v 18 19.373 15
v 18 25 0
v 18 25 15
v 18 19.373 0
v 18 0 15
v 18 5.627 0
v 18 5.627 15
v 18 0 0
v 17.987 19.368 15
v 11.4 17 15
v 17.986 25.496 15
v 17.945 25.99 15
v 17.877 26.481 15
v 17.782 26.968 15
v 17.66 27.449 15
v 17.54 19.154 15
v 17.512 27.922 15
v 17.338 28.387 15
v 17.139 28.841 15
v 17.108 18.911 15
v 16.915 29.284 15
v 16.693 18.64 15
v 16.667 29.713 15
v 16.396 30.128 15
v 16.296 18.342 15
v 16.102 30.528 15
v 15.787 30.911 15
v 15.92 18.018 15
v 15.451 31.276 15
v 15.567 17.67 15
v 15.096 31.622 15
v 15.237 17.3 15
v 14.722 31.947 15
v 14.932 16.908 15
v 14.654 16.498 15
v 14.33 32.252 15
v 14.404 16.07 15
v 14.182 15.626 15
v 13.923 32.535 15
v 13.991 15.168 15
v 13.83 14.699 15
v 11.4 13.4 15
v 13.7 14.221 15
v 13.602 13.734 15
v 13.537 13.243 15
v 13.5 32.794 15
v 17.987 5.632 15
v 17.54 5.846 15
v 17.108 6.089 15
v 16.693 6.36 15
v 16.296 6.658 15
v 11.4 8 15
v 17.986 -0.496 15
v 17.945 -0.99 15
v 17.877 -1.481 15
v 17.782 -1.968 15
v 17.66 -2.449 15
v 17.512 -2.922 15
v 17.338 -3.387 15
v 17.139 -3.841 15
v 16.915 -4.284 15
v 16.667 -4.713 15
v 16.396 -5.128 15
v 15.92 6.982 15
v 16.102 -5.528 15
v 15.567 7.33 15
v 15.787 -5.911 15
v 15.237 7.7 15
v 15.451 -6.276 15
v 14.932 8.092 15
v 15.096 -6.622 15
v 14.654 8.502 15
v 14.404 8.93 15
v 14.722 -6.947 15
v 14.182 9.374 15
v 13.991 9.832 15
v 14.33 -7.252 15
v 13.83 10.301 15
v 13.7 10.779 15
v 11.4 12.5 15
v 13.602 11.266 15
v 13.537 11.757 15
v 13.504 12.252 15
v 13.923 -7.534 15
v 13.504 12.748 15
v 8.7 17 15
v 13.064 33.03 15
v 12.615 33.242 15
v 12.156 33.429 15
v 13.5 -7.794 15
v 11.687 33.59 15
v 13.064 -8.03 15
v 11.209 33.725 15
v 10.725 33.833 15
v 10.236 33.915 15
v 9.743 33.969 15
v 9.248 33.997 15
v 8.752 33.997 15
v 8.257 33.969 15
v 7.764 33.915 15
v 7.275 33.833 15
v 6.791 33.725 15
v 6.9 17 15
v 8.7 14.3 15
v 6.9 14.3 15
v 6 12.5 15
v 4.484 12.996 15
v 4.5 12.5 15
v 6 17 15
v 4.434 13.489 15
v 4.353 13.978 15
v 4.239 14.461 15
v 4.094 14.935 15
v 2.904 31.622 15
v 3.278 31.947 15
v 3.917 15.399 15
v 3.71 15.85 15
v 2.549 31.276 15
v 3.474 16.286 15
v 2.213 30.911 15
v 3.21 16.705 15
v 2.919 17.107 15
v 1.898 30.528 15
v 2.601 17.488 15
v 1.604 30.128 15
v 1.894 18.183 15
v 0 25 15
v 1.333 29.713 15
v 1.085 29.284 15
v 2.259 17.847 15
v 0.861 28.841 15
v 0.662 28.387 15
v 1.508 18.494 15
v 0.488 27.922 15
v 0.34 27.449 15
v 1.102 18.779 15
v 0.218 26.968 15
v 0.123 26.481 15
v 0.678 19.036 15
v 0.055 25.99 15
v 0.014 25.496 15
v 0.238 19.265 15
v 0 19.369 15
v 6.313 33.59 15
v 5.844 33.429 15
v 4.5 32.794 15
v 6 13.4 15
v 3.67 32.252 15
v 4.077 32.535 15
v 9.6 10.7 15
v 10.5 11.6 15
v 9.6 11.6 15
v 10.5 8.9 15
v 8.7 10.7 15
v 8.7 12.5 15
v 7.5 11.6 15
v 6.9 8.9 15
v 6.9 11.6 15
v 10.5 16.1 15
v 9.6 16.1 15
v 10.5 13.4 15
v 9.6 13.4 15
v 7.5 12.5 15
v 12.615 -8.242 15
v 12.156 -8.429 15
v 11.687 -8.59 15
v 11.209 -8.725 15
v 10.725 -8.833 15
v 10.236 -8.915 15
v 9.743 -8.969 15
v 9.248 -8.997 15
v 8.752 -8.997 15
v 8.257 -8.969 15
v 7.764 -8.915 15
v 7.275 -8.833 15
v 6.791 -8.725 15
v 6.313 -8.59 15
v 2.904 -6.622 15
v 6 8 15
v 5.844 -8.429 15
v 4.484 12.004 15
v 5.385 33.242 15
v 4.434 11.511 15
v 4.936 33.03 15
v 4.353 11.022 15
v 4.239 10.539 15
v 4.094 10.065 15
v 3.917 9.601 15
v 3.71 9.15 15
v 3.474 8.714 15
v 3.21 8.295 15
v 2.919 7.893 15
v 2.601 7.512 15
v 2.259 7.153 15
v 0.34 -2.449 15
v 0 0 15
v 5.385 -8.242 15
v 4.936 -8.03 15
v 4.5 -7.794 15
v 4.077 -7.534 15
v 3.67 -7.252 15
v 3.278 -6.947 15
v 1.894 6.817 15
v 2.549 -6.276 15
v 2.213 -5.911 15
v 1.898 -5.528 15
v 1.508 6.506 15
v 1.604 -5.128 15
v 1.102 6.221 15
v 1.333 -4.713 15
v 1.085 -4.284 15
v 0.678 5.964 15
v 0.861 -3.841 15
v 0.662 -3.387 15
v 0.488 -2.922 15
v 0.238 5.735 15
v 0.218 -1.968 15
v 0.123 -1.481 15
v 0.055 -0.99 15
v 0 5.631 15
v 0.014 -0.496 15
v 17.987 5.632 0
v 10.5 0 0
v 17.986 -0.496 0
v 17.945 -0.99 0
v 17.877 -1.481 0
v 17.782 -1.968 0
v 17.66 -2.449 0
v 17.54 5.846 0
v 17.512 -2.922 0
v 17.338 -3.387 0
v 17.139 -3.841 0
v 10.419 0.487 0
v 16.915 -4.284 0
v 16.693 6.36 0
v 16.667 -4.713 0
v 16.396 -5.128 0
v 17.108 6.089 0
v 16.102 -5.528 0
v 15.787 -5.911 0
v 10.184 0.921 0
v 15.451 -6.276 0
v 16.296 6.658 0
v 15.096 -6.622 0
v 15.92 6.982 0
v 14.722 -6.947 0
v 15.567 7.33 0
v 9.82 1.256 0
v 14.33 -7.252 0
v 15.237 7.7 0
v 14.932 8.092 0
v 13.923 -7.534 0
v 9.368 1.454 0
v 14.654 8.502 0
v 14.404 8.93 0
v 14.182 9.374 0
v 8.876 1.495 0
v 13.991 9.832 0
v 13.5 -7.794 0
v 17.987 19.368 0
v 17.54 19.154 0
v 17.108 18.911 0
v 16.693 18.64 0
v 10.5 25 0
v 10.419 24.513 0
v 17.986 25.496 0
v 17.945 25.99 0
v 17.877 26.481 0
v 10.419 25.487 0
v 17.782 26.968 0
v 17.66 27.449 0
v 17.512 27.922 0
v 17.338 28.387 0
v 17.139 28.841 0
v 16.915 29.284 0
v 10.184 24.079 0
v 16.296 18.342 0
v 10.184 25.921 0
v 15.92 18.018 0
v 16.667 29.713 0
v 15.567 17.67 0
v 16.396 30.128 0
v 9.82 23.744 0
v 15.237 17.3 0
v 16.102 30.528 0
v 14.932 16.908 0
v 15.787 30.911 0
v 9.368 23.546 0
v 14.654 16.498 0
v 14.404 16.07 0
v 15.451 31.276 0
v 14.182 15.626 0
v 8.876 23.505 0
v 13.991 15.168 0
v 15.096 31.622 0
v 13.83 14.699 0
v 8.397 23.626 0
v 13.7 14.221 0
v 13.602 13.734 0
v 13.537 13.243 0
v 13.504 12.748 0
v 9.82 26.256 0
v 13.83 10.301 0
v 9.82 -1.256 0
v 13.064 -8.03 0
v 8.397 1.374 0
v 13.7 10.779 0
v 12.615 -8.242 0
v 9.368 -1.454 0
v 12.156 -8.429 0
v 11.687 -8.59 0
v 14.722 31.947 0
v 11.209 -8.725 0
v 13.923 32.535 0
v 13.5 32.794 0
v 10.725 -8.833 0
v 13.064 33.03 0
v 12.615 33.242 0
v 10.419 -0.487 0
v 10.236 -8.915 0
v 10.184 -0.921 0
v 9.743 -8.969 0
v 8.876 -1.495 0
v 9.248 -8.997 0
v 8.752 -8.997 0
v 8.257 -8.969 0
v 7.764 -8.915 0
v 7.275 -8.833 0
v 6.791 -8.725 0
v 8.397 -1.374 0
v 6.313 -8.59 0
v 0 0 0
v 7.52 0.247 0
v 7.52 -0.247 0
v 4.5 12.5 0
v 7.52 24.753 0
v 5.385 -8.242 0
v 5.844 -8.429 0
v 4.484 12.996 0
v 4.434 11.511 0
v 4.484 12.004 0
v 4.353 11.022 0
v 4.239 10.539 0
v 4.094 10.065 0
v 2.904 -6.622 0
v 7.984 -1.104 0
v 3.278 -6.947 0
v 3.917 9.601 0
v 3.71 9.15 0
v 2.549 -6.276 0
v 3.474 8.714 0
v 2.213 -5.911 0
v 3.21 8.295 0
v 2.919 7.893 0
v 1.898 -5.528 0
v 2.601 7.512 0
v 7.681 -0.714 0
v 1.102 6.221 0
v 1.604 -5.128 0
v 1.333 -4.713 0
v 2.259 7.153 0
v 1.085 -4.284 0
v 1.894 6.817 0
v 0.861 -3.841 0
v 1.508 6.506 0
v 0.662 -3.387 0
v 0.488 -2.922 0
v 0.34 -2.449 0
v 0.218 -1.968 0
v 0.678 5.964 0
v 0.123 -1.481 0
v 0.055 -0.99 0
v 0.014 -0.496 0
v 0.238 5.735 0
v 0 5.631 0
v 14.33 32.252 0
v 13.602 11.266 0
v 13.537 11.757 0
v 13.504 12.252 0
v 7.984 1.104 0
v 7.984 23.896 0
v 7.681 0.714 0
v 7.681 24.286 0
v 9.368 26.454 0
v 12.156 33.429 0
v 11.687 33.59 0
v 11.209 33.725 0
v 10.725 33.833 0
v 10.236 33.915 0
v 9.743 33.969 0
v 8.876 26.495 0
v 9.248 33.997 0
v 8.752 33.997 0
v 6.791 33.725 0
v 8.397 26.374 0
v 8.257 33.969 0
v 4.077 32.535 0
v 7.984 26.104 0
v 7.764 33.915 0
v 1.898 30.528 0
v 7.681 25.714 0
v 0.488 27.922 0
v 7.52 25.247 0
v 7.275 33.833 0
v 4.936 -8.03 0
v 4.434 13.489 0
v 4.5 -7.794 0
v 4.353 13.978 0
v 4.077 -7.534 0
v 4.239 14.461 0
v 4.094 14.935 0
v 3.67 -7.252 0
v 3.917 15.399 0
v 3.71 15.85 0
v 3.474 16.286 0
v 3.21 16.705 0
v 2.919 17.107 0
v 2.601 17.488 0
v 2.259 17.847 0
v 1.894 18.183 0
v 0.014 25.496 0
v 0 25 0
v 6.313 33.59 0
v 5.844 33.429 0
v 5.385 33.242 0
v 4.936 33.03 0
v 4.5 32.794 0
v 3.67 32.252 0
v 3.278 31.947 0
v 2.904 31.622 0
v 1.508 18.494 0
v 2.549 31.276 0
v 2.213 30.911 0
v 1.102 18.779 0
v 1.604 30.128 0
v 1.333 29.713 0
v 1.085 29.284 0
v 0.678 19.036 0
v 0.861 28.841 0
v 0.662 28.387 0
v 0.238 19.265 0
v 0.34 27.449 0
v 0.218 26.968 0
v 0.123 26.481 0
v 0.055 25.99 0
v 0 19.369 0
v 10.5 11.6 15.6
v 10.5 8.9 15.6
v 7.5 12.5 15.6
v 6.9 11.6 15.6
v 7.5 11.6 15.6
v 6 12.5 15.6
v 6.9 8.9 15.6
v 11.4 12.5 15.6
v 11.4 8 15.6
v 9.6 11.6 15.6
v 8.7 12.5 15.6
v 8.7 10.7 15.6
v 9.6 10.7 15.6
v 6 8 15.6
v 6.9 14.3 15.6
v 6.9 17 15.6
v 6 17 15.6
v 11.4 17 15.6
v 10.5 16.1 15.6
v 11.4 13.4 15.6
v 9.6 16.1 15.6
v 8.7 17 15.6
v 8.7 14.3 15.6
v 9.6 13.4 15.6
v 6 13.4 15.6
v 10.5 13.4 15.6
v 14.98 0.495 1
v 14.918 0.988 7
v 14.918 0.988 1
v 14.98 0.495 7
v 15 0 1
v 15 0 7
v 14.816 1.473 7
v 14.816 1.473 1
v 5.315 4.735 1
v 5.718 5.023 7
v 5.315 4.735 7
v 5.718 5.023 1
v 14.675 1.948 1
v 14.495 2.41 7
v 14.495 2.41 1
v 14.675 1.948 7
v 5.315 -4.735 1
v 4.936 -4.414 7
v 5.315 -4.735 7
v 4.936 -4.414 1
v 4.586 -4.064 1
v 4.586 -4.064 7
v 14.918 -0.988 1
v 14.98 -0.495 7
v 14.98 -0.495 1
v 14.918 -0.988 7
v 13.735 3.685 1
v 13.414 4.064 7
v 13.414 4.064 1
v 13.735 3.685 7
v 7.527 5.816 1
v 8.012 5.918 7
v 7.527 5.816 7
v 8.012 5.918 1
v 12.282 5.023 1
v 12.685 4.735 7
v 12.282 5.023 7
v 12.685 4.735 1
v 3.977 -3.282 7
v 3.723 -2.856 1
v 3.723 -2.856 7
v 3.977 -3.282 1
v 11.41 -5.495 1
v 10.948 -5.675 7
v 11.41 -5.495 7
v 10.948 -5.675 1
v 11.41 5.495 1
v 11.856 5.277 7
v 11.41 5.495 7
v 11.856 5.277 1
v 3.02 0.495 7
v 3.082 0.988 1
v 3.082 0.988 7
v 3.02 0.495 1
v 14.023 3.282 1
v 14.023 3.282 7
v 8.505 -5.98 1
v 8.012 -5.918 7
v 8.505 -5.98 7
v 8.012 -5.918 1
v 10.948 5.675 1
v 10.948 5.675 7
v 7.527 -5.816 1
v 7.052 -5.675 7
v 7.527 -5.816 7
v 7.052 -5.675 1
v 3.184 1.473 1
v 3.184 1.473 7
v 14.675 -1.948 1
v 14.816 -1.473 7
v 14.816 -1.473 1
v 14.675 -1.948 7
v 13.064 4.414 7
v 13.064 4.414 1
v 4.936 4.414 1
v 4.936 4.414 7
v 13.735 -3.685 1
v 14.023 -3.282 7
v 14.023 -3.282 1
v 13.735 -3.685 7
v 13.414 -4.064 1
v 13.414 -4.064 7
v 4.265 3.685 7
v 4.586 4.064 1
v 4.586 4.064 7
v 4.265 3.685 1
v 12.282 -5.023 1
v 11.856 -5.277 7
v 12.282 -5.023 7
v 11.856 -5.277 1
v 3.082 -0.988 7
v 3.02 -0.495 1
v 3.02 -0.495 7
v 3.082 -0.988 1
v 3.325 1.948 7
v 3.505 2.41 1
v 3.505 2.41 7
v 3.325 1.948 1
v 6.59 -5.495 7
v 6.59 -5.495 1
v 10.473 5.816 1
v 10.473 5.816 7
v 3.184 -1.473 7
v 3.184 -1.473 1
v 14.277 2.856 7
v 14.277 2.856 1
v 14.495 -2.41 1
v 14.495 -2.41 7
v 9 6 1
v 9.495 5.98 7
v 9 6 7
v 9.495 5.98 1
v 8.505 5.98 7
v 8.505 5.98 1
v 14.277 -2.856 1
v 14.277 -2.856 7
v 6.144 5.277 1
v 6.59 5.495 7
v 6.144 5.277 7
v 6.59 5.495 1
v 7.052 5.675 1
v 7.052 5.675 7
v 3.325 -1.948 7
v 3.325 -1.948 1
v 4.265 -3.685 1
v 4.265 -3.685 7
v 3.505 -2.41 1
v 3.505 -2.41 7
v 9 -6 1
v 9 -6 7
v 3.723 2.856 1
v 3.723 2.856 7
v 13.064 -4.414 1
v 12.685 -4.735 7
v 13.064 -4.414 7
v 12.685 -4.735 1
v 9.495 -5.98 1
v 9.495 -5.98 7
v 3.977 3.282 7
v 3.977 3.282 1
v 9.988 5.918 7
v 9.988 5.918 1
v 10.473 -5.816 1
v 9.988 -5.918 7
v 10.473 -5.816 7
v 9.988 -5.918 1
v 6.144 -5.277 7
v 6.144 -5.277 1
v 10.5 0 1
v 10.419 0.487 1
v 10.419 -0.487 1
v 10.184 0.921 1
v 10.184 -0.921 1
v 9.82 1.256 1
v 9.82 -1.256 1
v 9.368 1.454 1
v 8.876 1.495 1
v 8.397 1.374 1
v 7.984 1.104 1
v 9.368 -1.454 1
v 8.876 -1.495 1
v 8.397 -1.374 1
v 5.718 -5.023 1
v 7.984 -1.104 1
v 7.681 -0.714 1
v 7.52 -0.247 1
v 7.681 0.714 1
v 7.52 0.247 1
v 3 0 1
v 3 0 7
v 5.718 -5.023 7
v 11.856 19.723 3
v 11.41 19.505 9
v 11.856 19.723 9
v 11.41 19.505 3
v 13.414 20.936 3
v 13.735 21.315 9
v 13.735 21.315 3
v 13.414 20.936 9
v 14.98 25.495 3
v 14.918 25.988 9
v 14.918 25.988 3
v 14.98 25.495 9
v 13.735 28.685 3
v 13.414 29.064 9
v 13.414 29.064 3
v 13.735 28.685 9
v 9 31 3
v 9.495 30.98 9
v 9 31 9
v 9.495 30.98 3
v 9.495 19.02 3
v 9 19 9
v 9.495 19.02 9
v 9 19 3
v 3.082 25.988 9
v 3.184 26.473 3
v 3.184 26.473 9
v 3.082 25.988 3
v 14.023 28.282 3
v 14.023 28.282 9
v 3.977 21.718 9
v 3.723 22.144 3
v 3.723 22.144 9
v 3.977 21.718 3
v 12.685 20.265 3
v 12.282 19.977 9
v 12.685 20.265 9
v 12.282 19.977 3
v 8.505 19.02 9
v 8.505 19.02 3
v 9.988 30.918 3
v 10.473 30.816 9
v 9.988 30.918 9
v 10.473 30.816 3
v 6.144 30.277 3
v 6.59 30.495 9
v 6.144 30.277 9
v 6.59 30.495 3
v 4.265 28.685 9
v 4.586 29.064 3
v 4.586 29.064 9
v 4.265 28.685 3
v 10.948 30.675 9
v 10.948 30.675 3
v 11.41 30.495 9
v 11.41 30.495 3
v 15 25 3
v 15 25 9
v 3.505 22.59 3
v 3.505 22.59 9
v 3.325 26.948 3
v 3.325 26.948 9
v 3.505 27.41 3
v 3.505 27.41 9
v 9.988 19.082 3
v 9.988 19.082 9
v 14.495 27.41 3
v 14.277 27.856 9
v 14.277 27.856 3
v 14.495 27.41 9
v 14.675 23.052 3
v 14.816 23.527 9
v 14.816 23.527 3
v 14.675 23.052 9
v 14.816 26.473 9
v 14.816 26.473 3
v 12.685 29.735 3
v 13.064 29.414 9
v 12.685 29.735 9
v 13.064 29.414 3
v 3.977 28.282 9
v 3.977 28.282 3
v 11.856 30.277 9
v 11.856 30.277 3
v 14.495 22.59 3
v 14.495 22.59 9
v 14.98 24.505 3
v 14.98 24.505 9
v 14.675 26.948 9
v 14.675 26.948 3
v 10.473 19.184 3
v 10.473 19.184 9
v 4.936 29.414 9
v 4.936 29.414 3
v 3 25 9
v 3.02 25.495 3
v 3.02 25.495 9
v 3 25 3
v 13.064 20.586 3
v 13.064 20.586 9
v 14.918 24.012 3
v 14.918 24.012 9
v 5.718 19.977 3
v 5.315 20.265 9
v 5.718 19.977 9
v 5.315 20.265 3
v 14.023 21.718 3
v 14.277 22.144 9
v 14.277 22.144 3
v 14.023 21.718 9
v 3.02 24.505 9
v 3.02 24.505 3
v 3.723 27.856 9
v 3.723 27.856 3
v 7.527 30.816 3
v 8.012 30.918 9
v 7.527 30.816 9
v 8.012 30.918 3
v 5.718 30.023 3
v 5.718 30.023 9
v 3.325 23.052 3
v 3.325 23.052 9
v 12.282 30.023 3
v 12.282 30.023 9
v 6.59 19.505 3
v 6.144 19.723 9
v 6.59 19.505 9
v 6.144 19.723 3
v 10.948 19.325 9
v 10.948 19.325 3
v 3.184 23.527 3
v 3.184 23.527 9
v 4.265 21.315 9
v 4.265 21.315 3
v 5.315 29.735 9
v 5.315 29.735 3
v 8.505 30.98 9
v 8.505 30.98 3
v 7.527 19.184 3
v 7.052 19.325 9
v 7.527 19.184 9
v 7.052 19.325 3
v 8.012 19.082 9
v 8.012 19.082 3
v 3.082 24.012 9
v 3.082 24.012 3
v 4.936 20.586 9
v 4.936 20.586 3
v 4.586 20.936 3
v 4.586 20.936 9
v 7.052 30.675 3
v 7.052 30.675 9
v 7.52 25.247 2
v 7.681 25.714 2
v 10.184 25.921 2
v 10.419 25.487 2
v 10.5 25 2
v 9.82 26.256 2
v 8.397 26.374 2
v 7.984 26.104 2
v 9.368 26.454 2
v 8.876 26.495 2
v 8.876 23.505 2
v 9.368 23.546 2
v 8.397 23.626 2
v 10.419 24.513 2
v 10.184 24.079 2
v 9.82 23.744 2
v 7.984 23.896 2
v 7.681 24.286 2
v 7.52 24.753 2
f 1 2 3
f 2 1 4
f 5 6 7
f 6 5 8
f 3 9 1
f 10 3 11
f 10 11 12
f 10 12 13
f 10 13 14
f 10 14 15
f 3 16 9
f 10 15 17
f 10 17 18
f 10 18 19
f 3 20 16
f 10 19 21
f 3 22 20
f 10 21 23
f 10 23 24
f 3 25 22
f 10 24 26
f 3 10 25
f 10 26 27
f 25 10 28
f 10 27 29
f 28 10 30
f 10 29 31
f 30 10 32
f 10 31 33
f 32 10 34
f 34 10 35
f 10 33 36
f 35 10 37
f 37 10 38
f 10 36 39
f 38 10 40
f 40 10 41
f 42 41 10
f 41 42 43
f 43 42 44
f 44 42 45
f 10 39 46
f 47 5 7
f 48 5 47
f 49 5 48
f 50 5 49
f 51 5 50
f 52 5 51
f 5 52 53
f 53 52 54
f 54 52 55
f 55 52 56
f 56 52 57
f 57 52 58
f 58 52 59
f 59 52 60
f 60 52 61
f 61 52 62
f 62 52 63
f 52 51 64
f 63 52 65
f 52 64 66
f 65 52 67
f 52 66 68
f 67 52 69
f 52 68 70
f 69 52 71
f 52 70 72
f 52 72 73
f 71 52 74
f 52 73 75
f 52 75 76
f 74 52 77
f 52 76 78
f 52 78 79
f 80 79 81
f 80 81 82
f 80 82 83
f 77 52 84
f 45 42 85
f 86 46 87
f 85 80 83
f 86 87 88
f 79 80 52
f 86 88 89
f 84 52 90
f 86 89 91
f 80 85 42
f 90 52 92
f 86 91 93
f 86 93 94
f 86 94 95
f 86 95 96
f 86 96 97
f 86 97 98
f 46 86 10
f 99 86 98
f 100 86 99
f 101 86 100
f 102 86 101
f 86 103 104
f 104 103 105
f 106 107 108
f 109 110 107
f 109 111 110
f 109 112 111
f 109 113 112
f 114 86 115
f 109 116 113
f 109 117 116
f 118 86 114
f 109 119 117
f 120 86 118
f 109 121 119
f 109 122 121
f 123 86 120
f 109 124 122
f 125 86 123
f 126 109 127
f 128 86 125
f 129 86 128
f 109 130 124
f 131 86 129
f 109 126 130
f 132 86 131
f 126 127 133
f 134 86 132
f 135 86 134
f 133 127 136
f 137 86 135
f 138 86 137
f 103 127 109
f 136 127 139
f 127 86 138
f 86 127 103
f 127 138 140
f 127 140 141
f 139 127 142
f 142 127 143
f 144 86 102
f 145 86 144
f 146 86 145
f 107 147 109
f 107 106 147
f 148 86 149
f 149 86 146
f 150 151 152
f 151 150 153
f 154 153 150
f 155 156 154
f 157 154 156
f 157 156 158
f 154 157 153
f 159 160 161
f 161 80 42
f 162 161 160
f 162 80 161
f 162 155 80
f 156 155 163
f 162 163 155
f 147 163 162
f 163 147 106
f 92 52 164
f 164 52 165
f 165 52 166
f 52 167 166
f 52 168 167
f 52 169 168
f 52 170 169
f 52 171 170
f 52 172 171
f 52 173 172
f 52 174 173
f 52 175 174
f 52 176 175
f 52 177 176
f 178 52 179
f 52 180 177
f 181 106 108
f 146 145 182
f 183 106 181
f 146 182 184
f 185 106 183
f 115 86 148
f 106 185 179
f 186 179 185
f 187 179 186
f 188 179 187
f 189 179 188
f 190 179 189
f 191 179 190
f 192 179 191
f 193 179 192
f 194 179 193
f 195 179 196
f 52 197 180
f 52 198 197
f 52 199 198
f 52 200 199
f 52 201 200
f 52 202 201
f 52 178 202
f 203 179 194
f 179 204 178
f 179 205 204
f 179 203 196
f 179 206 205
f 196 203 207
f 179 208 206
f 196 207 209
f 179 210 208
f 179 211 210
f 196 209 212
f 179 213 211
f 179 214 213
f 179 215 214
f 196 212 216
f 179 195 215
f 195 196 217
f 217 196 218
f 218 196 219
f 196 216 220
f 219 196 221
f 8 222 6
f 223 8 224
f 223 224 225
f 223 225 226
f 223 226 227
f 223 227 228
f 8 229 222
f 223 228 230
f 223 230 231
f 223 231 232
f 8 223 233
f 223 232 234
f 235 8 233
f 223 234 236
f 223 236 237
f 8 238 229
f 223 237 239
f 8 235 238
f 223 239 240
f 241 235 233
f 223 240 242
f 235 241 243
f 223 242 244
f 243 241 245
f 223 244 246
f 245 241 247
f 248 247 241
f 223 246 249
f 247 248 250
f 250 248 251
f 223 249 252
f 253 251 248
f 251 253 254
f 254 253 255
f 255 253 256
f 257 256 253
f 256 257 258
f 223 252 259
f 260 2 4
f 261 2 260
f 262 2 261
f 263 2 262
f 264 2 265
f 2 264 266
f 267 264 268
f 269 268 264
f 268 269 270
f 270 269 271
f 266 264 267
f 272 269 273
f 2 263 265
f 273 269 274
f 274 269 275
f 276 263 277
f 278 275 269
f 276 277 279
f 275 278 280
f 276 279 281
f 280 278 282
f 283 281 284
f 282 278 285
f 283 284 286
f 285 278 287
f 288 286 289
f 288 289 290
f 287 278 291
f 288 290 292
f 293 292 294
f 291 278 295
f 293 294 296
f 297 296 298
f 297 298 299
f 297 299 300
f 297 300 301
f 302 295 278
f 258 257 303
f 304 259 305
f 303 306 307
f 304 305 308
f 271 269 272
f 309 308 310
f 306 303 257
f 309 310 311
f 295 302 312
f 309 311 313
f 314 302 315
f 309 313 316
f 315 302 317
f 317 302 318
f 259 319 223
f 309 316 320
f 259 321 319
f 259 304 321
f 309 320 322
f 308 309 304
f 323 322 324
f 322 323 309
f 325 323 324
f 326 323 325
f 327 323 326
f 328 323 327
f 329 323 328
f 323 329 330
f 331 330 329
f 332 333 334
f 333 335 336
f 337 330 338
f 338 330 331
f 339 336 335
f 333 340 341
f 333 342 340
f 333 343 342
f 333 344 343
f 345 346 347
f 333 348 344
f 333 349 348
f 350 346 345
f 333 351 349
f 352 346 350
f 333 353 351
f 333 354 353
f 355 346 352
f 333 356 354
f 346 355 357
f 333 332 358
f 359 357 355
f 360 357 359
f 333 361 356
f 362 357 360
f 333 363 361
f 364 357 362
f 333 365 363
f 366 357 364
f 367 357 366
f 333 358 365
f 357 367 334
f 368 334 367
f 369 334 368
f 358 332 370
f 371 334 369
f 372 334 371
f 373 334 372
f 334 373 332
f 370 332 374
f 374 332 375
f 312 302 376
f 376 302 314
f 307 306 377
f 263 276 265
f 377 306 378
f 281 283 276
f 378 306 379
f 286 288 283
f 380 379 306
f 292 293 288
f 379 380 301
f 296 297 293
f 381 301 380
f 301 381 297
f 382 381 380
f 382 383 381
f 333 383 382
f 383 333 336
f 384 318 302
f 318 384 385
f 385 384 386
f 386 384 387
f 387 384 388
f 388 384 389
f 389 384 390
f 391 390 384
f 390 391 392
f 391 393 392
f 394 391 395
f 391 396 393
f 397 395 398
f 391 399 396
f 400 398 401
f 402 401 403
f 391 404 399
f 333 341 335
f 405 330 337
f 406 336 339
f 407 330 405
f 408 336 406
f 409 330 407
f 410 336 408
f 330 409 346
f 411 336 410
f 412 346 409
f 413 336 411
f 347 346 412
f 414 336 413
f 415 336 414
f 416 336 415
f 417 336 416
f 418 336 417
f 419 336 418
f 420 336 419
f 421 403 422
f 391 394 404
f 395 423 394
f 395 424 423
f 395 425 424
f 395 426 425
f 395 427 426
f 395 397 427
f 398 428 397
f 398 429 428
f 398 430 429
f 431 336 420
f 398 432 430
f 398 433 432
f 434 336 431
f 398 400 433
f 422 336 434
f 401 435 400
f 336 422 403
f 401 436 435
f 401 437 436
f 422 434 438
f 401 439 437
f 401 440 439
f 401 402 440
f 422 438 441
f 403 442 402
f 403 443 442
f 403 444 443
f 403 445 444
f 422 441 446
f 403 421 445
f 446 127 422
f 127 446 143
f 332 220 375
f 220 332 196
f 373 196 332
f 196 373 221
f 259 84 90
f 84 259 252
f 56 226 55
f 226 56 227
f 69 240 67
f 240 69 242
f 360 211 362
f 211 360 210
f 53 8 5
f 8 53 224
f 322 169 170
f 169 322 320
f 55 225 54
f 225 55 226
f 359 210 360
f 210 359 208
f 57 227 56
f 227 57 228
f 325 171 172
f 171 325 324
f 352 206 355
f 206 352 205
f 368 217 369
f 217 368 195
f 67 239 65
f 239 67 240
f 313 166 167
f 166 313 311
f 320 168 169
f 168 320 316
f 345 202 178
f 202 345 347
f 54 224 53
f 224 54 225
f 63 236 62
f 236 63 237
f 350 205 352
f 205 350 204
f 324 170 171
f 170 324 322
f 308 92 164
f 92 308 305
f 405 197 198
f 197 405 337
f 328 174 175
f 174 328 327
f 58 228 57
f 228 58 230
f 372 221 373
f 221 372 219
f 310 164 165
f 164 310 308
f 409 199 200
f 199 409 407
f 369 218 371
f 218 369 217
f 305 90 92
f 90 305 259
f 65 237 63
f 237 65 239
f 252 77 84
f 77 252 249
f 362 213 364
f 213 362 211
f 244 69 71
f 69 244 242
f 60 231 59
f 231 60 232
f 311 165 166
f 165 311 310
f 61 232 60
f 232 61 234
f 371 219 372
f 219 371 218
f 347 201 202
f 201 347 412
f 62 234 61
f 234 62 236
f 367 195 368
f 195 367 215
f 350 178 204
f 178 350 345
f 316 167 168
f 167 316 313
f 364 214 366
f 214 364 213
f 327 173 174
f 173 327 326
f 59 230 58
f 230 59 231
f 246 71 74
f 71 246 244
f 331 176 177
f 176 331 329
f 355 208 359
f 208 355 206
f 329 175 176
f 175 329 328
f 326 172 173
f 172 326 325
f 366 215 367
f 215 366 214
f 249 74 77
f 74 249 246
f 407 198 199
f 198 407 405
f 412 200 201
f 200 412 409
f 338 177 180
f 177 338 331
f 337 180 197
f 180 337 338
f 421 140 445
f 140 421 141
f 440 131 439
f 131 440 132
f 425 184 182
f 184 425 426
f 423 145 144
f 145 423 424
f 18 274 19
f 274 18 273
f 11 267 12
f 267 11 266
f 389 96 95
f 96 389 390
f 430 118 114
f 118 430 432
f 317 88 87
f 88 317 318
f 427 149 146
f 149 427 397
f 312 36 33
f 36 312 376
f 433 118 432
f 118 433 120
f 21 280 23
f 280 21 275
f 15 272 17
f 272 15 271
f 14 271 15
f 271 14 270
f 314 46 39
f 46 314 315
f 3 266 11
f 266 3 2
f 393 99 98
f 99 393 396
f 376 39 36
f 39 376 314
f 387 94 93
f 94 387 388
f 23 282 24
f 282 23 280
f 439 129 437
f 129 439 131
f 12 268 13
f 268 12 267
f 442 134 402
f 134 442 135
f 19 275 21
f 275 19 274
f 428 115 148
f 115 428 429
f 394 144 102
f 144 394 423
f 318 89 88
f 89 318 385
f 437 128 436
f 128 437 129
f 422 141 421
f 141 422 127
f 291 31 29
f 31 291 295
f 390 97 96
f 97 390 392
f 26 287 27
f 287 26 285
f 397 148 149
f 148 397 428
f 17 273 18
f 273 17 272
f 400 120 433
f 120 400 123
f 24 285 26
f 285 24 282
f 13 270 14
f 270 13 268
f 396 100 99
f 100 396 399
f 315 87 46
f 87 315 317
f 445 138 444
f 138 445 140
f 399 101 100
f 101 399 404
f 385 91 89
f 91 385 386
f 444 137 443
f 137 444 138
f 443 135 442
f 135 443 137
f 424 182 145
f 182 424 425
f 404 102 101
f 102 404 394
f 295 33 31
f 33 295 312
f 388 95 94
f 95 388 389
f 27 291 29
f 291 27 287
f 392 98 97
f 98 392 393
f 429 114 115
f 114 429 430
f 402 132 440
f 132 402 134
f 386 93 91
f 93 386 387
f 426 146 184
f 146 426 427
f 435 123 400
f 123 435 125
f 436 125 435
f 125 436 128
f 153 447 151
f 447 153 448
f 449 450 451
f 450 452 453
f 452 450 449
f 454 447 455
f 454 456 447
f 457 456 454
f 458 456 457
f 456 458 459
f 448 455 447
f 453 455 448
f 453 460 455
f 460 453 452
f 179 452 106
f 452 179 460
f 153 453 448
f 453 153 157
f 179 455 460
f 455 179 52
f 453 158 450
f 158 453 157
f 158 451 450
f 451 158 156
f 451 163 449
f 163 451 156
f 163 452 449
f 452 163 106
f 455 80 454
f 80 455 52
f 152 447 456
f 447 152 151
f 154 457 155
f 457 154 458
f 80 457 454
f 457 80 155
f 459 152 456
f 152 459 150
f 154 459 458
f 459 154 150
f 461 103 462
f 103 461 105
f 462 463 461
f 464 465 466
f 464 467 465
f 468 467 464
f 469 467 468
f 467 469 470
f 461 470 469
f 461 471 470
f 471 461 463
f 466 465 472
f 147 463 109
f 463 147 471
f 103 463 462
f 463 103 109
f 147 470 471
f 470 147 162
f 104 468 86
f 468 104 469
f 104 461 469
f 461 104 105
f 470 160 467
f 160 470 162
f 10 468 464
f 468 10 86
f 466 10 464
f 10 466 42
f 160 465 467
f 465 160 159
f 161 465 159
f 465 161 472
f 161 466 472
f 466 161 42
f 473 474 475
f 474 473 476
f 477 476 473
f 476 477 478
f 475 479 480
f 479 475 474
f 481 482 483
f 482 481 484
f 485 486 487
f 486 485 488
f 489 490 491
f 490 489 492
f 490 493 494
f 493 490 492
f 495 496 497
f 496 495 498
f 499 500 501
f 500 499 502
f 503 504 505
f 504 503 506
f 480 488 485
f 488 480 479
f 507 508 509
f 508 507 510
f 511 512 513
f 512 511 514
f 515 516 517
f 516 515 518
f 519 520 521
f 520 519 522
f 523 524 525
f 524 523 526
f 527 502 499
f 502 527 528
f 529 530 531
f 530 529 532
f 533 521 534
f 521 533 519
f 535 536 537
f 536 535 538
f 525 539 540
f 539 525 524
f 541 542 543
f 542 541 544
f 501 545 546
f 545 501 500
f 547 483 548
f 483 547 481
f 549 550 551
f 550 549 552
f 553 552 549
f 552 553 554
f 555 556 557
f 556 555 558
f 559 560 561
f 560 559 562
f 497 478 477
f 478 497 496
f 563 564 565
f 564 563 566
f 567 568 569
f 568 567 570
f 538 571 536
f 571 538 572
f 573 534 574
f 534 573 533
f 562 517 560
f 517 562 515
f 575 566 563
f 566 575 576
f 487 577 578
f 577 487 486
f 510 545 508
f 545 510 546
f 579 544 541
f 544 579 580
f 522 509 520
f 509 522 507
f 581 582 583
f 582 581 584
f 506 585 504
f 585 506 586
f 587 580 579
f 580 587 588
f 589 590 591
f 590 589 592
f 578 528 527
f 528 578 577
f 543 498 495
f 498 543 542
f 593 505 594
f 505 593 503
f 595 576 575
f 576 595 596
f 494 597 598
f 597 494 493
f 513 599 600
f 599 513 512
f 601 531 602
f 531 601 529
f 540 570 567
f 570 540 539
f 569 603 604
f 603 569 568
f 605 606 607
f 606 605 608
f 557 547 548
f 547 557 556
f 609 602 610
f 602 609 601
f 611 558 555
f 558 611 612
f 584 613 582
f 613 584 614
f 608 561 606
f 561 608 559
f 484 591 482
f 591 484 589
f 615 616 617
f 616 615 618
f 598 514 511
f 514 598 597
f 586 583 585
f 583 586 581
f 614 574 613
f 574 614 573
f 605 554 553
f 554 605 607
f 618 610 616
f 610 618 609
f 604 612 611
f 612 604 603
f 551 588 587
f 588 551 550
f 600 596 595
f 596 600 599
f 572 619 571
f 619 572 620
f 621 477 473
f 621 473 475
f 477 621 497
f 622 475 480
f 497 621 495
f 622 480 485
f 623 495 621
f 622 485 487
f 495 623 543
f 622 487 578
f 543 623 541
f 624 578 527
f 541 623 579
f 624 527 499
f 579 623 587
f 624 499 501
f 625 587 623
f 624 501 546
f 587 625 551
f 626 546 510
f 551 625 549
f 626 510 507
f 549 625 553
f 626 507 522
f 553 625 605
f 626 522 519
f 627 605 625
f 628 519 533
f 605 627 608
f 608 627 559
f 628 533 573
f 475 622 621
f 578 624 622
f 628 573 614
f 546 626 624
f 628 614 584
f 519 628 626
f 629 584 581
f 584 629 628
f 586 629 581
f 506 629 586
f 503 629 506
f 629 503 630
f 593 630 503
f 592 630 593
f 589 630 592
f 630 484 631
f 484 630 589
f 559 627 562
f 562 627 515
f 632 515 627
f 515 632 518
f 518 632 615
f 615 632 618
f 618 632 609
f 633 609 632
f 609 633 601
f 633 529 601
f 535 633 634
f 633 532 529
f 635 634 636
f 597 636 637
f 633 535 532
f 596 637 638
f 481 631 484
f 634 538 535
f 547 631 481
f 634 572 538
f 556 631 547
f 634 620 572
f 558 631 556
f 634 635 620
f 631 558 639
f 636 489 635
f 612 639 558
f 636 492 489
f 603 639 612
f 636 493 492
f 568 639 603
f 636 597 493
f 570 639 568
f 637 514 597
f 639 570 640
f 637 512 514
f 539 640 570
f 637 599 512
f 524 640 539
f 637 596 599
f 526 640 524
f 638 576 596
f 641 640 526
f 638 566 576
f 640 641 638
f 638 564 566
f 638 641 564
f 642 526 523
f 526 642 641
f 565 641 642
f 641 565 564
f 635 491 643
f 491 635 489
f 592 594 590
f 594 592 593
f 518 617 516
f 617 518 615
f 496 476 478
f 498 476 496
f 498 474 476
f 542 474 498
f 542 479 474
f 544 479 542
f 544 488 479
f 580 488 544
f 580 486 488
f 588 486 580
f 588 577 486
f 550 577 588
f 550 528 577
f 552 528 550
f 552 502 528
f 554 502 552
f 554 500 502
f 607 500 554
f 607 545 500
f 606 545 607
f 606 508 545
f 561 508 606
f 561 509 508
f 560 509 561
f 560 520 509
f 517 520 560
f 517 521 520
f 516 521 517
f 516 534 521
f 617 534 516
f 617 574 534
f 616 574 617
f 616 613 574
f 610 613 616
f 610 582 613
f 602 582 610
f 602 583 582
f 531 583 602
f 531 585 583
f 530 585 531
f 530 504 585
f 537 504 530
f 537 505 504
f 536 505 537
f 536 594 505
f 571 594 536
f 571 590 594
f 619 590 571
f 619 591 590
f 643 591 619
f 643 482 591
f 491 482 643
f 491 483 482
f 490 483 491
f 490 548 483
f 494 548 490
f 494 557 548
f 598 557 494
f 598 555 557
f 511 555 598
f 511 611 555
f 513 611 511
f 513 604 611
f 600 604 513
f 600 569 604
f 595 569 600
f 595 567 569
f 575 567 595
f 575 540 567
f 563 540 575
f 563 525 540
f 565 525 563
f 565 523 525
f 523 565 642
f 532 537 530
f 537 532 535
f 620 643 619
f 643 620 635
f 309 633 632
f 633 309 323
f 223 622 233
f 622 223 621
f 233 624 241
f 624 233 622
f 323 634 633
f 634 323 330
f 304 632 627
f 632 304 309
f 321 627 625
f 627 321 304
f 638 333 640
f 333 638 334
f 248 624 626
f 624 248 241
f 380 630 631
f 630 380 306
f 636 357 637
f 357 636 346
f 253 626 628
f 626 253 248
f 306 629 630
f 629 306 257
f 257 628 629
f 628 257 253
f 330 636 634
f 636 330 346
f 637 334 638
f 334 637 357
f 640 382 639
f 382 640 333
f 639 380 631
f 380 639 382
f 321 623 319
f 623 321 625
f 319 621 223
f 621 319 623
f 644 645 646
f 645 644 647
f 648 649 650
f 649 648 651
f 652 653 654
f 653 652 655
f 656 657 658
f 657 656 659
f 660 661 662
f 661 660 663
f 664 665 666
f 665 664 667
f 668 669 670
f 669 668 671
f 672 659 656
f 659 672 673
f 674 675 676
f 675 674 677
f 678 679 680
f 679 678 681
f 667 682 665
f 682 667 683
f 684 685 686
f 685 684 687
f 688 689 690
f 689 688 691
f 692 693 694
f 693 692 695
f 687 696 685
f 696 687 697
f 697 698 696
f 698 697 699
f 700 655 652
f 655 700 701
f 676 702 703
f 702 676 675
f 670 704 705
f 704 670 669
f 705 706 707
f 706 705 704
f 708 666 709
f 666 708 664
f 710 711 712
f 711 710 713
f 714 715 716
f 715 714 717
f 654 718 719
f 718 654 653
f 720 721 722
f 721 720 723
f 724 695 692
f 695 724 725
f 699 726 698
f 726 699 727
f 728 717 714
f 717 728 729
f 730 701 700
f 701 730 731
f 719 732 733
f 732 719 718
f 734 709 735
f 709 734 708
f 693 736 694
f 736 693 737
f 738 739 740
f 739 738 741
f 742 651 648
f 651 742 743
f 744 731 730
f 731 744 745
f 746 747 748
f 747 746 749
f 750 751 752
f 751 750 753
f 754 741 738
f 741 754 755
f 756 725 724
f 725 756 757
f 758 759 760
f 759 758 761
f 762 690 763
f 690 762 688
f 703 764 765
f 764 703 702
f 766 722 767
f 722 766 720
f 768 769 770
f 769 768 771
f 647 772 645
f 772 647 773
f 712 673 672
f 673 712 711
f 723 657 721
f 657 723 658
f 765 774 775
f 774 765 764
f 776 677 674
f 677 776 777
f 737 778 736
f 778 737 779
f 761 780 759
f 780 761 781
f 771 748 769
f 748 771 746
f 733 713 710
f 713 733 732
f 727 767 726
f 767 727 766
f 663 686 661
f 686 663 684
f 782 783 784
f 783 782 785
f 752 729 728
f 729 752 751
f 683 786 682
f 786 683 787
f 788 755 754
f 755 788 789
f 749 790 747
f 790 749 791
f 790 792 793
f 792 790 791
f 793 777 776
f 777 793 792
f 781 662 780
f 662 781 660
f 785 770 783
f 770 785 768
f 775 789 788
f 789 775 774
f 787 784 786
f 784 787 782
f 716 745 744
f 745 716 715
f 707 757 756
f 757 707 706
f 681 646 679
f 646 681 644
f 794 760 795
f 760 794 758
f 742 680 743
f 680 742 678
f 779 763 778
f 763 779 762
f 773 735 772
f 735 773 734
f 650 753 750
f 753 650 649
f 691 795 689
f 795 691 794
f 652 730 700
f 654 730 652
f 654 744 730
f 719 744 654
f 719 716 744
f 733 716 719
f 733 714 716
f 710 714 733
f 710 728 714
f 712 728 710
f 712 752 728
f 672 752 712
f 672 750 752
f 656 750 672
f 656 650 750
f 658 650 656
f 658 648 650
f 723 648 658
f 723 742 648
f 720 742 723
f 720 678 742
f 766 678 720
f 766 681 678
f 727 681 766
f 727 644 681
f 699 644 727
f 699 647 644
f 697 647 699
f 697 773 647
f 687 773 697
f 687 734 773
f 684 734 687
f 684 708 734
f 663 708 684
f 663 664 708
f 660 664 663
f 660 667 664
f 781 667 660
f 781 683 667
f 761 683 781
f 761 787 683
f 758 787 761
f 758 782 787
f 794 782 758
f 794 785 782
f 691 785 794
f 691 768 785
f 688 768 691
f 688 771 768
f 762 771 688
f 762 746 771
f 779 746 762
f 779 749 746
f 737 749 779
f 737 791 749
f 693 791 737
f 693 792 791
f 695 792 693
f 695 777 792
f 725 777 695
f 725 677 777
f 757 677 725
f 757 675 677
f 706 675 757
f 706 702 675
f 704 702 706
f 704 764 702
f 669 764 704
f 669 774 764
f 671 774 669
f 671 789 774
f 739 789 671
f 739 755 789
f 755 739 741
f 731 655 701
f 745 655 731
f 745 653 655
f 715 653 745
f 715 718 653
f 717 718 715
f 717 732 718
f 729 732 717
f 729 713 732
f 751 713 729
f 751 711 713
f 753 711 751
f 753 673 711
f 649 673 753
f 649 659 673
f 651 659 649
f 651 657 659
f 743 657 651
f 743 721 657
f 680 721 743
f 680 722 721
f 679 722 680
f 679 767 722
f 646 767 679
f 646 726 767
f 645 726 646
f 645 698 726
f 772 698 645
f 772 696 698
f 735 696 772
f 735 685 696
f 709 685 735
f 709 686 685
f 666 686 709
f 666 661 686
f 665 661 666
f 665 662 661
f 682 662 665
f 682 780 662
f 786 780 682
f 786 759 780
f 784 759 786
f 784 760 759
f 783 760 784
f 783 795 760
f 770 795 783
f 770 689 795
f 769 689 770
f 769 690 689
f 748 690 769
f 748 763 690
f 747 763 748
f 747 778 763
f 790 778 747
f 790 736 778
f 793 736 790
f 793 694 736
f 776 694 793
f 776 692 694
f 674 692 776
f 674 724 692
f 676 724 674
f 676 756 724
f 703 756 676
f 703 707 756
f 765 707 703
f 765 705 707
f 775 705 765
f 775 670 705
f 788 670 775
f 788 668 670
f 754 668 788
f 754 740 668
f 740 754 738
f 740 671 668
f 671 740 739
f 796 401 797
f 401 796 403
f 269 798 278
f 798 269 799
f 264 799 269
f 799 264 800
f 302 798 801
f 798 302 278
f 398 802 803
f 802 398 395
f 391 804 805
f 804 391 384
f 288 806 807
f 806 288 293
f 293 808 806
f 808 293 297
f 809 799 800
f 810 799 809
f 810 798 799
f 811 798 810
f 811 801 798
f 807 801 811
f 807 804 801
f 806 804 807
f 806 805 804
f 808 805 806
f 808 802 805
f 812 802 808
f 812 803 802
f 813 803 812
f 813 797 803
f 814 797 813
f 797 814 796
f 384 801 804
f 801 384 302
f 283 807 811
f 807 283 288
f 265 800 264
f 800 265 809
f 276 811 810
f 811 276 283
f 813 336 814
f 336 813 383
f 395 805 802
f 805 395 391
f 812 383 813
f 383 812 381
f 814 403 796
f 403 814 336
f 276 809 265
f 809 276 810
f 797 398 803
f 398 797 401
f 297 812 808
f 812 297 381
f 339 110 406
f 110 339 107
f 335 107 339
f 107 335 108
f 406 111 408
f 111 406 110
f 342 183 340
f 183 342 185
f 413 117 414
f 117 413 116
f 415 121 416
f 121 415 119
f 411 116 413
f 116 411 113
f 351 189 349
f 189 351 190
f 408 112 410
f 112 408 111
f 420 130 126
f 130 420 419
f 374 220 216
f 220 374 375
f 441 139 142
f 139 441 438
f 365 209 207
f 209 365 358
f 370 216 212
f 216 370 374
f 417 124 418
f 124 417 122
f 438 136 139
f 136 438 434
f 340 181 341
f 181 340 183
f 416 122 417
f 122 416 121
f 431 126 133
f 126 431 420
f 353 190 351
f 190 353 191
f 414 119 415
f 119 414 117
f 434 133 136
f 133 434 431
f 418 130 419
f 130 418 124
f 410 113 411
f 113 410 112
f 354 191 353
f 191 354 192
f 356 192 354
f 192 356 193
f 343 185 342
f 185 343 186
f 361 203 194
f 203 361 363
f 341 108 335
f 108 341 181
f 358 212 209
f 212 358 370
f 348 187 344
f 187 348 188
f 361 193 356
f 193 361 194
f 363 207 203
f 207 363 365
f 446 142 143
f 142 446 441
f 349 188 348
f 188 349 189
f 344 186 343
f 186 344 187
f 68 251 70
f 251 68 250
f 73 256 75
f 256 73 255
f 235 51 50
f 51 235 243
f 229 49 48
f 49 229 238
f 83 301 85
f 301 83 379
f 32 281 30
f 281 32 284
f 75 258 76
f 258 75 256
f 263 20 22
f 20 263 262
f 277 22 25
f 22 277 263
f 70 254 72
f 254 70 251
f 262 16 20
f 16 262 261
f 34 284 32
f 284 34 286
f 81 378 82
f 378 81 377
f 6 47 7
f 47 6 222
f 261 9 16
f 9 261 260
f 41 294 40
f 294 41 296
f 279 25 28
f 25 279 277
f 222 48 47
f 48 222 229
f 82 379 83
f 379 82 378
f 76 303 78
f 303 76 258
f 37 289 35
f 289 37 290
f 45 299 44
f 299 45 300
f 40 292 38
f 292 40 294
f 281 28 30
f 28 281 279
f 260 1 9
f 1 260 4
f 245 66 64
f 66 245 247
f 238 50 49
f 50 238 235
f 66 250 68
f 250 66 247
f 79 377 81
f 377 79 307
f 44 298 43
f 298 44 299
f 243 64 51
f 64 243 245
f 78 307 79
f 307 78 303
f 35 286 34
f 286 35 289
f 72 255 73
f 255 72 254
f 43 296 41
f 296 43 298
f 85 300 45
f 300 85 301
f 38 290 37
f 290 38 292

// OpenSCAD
$fa=.5;
$fs=.5;
magnet_height=6; //[1:11]
magnet_diameter=12; //[1:17]
module GSLogo(){
cube([15,3,2]);   //The G
cube([3,12,2]);
translate([0,12,0])cube([5,3,2]);
translate([15,0,0])cube([3,12,2]);
translate([9,12,0])cube([9,3,2]);
translate([9,9,0])cube([3,5,2]);
	translate([0,18,0])cube([3,12,2]);  //The S
	translate([0,18,0])cube([9,3,2]);
	translate([9,18,0])cube([3,12,2]);
	translate([9,27,0])cube([9,3,2]);
	translate([15,18,0])cube([3,12,2]);
}


difference()
{
	union()
	{
	color("blue"){
	cube([18,25,15]);
	translate([9,0,0])cylinder(h=15,r=9);
	translate([9,25,0])cylinder(h=15,r=9);
	}
	color("red")translate([6,8,15])scale(v=[.3,.3,.3])GSLogo();
	
}
translate([9,0,1])cylinder(h=magnet_height,d=magnet_diameter);
translate([9,0,-1])cylinder(h=3,d=3);
translate([9,25,3])cylinder(h=magnet_height,d=magnet_diameter);
translate([9,25,-1])cylinder(h=3,d=3);
translate([-3,12.5,-1])cylinder(h=17, r=7.5);
translate([21,12.5,-1])cylinder(h=17, r=7.5);
}
